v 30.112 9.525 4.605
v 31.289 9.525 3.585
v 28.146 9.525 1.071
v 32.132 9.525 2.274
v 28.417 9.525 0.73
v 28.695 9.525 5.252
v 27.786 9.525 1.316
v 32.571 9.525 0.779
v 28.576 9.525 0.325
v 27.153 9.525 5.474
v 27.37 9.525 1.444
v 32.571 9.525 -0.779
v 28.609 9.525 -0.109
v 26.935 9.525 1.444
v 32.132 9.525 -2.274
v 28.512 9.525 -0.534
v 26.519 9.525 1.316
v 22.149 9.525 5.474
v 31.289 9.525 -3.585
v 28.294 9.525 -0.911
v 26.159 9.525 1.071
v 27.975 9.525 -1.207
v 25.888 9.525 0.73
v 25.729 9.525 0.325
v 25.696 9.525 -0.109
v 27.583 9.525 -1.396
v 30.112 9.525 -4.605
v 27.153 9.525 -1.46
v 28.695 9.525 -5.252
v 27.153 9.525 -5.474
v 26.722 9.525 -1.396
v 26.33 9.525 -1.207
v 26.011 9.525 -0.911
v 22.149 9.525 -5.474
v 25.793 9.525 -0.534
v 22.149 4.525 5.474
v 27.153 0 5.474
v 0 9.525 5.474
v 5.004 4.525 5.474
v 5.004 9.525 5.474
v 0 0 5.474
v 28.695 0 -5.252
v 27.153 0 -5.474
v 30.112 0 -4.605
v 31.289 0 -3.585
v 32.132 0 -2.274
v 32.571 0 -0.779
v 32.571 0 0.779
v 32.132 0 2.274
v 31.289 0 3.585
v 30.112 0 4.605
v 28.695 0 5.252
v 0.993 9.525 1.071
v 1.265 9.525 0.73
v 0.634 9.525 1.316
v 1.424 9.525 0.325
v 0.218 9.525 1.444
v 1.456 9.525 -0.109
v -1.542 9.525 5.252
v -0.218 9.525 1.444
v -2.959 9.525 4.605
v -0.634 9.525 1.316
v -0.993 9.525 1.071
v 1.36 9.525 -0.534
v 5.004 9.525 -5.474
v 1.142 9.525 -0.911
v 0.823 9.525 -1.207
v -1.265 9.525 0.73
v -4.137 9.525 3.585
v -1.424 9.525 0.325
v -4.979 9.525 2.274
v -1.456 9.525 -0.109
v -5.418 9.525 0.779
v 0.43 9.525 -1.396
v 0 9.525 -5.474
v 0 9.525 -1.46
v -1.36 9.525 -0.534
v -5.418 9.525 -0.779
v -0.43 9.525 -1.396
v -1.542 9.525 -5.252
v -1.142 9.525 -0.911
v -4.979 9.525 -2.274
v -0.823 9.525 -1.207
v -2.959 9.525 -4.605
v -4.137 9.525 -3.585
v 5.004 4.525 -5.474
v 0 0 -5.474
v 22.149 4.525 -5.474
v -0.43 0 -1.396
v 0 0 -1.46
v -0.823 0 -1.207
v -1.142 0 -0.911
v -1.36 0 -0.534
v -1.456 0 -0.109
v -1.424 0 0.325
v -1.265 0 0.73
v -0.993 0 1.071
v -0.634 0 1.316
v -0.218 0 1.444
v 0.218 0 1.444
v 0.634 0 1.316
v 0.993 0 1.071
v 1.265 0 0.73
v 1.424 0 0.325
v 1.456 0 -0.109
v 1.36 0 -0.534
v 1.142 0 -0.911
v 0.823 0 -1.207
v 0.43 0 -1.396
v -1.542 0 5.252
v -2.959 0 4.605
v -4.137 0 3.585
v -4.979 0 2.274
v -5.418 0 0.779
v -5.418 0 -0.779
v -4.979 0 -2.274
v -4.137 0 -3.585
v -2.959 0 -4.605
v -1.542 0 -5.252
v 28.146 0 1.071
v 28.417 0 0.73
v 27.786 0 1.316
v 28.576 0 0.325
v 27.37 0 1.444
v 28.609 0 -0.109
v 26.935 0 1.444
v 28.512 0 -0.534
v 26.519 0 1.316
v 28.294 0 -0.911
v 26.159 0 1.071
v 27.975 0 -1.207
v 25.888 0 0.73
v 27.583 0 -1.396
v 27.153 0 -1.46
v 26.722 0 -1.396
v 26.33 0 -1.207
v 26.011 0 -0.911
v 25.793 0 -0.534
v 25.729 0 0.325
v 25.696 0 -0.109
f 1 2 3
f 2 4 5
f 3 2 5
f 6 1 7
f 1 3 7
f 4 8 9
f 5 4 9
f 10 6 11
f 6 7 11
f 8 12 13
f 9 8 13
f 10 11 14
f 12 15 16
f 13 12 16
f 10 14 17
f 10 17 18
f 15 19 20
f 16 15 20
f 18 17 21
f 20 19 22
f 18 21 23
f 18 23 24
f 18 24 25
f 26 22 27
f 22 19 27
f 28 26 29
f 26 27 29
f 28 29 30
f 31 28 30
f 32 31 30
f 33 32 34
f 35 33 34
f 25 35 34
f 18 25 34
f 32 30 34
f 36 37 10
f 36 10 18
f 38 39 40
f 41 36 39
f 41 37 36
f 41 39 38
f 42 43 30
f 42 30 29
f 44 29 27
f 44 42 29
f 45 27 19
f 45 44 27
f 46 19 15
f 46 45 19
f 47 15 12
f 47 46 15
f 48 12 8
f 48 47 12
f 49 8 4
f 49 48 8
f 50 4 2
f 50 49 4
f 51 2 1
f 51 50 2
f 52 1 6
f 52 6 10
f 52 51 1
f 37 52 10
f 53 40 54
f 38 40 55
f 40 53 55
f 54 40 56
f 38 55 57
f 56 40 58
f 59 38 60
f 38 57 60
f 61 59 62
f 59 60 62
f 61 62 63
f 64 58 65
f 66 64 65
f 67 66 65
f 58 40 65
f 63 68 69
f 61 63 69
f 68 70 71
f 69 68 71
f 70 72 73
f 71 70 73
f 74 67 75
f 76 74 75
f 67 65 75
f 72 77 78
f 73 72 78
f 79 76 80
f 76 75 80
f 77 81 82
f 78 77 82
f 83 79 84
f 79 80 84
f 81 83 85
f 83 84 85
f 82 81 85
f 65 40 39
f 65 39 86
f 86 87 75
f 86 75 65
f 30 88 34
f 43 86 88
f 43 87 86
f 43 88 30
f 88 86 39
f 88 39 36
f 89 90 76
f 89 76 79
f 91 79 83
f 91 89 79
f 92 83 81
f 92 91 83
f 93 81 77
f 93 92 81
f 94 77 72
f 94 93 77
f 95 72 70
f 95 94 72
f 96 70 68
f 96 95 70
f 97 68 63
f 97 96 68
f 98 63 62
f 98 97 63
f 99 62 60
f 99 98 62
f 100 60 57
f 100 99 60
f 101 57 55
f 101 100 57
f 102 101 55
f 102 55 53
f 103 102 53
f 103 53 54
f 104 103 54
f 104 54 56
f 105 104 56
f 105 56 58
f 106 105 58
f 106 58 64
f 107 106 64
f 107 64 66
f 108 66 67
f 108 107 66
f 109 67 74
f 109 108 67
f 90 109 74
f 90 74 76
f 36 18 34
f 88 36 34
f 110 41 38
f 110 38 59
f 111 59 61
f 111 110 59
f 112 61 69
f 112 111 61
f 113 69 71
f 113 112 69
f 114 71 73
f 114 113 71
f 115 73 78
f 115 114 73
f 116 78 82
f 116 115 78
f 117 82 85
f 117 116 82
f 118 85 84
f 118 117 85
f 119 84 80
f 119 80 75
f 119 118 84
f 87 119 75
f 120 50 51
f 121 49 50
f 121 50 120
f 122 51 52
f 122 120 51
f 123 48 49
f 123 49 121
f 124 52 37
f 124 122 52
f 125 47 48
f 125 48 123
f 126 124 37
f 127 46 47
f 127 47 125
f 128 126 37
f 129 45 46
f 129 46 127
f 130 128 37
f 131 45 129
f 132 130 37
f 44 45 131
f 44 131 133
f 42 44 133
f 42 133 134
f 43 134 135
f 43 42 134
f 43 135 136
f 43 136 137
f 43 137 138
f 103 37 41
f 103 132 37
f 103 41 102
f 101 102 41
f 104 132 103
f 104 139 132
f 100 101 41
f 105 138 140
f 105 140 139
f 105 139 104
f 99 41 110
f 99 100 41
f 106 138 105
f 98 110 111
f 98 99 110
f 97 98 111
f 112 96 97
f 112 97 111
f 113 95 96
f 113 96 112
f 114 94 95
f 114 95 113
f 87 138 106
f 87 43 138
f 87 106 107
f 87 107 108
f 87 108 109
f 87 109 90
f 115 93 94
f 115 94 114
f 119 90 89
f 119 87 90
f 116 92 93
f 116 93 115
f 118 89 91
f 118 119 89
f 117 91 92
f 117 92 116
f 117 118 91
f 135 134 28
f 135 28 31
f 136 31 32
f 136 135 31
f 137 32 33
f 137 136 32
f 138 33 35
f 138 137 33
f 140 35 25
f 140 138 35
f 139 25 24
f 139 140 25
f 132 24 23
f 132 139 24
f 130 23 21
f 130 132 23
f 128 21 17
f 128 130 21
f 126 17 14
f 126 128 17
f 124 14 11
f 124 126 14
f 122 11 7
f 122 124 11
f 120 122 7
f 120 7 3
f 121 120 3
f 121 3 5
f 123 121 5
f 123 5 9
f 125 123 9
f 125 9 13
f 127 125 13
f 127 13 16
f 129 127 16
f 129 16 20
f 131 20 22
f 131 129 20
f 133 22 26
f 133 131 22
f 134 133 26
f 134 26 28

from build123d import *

# Parameters (mm, degrees)
SKETCH1_R           = 1.4605
BOSS_EXTRUDE1_DEPTH = 9.525
SKETCH2_W           = 17.145
SKETCH2_H           = 10.9474
CUT_EXTRUDE1_DEPTH  = 5


with BuildPart() as part:
    # Sketch1 → Boss-Extrude1 (new body)
    with BuildSketch(Plane(origin=(0, 0, 0), x_dir=(1, 0, 0), z_dir=(0, 1, 0))):
        with BuildLine():
            Line((0, 5.4737), (27.1526, 5.4737))
            ThreePointArc((27.1526, 5.4737), (32.6263, 0), (27.1526, -5.4737))
            Line((27.1526, -5.4737), (0, -5.4737))
            ThreePointArc((0, -5.4737), (-5.4737, 0), (0, 5.4737))
        make_face()
        with Locations(Location((0, 0, 0), (0, 0, 90))):
            Circle(SKETCH1_R, mode=Mode.SUBTRACT)
        with Locations(Location((27.1526, 0, 0), (0, 0, 90))):
            Circle(SKETCH1_R, mode=Mode.SUBTRACT)
    extrude(amount=BOSS_EXTRUDE1_DEPTH)

    # Sketch2 → Cut-Extrude1 (cut)
    with BuildSketch(Plane(origin=(0, 9.525, 0), x_dir=(1, 0, 0), z_dir=(0, 1, 0))):
        with Locations((13.5763, 0)):
            Rectangle(SKETCH2_W, SKETCH2_H)
    extrude(amount=-CUT_EXTRUDE1_DEPTH, mode=Mode.SUBTRACT)


solid = part.part
